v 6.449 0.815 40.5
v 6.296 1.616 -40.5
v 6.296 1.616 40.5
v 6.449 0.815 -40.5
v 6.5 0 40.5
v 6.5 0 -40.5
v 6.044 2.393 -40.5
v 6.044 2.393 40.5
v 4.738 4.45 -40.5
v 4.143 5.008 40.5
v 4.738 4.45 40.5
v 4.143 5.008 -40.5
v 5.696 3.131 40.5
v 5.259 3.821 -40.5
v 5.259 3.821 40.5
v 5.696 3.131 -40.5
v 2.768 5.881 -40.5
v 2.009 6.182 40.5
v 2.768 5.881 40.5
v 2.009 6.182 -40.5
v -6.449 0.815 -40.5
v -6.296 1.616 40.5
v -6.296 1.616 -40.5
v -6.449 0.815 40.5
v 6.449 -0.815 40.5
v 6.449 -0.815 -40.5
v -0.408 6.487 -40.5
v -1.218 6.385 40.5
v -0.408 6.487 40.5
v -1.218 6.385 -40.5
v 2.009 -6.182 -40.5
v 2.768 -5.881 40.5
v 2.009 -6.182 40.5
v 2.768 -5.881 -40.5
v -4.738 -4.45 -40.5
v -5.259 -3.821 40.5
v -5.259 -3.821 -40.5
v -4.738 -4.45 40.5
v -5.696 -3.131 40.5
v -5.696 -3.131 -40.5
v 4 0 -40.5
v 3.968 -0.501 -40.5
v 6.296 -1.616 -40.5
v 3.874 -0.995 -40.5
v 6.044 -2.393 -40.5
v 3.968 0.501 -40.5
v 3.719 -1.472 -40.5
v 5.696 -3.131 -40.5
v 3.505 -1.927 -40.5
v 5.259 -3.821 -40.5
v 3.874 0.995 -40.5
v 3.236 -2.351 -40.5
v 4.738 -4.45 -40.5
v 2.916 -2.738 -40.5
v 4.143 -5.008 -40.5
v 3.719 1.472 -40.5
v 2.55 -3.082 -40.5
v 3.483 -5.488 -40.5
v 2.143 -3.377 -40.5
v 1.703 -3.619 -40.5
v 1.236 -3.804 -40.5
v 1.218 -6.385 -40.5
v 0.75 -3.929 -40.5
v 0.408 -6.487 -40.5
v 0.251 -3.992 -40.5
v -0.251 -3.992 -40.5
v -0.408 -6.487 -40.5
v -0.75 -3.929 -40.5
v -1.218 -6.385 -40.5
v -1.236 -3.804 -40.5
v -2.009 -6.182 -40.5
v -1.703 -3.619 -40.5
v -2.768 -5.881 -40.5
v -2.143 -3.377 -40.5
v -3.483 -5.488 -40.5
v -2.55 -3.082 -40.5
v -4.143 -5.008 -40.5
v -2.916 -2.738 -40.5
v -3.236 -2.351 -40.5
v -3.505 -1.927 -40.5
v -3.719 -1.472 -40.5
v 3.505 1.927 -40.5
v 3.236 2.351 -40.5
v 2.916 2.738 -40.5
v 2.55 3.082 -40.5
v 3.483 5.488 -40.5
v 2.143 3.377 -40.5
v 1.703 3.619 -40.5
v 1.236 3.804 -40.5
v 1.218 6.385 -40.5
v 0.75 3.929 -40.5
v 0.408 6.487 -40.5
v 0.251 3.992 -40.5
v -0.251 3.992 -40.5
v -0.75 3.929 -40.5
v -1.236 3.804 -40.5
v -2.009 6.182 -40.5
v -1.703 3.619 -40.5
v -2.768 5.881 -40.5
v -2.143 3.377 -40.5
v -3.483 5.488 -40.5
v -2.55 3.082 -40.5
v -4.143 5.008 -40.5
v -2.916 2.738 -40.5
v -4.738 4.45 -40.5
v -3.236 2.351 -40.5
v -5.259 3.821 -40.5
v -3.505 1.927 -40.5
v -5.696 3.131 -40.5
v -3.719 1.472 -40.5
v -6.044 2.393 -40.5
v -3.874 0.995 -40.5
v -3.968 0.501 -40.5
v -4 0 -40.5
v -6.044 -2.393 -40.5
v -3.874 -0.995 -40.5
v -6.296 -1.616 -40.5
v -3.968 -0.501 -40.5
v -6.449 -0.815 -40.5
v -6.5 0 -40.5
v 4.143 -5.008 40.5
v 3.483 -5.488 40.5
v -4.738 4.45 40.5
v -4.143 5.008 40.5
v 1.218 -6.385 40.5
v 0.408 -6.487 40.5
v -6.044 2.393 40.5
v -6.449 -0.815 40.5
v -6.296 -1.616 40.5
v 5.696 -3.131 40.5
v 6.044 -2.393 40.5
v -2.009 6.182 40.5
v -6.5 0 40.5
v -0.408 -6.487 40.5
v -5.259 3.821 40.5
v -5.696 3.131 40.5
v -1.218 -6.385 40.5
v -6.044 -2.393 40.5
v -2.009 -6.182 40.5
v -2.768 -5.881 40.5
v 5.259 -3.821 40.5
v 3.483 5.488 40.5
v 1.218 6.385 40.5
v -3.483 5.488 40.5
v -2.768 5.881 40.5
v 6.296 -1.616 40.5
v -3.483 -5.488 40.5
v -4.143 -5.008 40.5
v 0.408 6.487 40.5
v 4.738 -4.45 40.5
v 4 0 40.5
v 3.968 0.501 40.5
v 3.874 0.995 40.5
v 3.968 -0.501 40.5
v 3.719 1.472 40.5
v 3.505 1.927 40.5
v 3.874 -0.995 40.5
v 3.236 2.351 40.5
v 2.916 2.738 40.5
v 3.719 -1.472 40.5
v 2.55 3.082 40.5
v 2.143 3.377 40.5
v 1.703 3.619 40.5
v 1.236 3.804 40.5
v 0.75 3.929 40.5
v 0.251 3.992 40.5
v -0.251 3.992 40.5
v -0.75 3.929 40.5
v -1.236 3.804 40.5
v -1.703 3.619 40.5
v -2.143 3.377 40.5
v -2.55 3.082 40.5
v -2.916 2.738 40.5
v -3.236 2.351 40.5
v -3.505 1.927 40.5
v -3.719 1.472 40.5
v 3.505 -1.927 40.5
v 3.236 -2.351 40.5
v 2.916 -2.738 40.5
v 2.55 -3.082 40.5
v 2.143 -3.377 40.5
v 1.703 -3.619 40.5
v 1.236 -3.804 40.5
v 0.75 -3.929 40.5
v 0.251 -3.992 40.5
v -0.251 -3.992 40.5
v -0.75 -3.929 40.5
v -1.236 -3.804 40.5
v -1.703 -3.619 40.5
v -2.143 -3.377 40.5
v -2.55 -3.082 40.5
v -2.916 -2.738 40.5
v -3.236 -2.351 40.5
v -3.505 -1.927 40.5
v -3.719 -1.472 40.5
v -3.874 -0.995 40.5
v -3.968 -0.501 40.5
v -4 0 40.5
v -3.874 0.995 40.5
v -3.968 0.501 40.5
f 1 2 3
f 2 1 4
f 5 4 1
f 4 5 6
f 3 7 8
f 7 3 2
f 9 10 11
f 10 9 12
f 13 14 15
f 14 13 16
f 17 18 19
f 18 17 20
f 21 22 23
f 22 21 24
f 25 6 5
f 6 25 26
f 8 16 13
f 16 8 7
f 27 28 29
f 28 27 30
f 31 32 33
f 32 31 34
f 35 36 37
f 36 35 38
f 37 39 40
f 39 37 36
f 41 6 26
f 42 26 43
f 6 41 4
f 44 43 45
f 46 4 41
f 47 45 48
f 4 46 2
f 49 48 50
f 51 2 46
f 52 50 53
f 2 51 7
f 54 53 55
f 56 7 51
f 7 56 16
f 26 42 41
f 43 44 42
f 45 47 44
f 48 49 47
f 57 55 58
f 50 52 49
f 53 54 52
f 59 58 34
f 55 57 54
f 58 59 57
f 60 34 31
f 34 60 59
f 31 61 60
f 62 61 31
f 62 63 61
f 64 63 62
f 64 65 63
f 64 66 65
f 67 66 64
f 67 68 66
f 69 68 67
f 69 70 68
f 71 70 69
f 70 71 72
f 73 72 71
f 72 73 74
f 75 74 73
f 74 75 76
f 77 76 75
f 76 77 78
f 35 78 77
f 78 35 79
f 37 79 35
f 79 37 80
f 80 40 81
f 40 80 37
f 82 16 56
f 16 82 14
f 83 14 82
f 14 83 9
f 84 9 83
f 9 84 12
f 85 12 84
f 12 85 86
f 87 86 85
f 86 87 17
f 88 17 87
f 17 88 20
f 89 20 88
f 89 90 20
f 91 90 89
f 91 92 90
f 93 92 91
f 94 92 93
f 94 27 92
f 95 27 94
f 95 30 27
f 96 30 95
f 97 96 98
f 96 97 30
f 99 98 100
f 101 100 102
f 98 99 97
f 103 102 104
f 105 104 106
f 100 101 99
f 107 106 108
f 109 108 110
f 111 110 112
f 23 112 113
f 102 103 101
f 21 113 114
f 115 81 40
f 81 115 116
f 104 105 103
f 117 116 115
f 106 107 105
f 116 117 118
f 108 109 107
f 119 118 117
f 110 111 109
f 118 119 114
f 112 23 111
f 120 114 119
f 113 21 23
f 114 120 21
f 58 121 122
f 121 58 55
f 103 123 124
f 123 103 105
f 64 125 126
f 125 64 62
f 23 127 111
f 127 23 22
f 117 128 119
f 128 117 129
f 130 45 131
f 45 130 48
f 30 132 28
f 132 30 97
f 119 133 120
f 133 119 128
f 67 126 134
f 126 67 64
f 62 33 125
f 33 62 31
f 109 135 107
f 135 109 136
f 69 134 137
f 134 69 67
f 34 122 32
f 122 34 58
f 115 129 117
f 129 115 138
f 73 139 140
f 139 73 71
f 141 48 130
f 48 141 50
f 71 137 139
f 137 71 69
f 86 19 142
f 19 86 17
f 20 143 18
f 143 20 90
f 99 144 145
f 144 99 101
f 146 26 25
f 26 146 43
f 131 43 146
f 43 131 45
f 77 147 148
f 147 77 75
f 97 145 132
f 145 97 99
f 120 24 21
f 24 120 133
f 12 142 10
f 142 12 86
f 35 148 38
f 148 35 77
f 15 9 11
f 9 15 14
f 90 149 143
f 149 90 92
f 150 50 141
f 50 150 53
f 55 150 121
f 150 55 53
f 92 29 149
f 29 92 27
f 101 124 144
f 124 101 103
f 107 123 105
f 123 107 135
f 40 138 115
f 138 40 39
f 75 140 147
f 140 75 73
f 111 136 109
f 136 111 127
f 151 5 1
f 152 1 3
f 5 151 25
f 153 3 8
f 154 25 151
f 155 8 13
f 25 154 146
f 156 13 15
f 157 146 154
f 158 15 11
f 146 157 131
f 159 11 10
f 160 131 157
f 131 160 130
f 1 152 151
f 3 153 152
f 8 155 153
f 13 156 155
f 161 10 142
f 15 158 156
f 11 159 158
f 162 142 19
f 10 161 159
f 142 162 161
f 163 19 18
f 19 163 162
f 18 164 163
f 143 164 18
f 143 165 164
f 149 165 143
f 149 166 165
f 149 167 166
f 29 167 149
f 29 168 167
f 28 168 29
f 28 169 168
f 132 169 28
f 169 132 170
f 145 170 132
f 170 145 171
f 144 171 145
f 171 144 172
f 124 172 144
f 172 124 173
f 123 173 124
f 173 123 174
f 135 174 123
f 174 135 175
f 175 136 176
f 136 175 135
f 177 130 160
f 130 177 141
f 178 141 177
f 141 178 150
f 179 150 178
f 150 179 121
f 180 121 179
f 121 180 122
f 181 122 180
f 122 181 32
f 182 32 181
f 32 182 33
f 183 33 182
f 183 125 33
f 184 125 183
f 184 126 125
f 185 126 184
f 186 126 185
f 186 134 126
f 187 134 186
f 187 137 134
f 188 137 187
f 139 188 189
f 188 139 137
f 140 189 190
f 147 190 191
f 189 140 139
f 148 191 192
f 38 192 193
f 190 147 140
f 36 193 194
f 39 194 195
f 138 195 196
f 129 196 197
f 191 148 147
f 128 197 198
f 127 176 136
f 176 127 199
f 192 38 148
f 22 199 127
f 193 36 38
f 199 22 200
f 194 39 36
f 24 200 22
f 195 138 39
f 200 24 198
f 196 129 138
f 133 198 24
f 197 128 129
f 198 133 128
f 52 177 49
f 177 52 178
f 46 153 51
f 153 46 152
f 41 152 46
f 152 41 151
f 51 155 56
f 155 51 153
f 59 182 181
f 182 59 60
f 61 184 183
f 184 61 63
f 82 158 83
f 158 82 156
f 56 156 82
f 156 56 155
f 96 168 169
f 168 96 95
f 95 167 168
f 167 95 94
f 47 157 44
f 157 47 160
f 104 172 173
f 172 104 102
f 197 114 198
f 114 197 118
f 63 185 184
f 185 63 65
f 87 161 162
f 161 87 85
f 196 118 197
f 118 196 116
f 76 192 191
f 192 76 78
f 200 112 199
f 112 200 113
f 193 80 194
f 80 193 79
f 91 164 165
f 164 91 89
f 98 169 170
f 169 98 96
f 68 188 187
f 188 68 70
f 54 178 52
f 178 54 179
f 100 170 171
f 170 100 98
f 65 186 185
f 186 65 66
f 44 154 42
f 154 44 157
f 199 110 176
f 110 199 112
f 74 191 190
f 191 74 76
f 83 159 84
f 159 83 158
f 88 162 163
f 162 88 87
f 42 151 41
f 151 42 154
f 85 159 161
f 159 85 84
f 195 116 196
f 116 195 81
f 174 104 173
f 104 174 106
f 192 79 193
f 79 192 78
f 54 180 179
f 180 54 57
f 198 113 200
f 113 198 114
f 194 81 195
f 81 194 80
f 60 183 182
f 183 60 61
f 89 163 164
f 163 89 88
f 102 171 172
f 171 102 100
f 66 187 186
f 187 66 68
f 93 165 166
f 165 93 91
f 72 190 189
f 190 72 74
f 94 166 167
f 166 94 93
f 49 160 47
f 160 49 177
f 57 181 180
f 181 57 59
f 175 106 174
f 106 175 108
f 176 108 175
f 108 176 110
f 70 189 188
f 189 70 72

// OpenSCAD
$fn = 50;


difference() {
	union() {
		translate(v = [0, 0, -40.5000000000]) {
			cylinder(h = 81, r = 6.5000000000);
		}
	}
	union() {
		translate(v = [0, 0, -100.0000000000]) {
			cylinder(h = 200, r = 4.0000000000);
		}
	}
}
